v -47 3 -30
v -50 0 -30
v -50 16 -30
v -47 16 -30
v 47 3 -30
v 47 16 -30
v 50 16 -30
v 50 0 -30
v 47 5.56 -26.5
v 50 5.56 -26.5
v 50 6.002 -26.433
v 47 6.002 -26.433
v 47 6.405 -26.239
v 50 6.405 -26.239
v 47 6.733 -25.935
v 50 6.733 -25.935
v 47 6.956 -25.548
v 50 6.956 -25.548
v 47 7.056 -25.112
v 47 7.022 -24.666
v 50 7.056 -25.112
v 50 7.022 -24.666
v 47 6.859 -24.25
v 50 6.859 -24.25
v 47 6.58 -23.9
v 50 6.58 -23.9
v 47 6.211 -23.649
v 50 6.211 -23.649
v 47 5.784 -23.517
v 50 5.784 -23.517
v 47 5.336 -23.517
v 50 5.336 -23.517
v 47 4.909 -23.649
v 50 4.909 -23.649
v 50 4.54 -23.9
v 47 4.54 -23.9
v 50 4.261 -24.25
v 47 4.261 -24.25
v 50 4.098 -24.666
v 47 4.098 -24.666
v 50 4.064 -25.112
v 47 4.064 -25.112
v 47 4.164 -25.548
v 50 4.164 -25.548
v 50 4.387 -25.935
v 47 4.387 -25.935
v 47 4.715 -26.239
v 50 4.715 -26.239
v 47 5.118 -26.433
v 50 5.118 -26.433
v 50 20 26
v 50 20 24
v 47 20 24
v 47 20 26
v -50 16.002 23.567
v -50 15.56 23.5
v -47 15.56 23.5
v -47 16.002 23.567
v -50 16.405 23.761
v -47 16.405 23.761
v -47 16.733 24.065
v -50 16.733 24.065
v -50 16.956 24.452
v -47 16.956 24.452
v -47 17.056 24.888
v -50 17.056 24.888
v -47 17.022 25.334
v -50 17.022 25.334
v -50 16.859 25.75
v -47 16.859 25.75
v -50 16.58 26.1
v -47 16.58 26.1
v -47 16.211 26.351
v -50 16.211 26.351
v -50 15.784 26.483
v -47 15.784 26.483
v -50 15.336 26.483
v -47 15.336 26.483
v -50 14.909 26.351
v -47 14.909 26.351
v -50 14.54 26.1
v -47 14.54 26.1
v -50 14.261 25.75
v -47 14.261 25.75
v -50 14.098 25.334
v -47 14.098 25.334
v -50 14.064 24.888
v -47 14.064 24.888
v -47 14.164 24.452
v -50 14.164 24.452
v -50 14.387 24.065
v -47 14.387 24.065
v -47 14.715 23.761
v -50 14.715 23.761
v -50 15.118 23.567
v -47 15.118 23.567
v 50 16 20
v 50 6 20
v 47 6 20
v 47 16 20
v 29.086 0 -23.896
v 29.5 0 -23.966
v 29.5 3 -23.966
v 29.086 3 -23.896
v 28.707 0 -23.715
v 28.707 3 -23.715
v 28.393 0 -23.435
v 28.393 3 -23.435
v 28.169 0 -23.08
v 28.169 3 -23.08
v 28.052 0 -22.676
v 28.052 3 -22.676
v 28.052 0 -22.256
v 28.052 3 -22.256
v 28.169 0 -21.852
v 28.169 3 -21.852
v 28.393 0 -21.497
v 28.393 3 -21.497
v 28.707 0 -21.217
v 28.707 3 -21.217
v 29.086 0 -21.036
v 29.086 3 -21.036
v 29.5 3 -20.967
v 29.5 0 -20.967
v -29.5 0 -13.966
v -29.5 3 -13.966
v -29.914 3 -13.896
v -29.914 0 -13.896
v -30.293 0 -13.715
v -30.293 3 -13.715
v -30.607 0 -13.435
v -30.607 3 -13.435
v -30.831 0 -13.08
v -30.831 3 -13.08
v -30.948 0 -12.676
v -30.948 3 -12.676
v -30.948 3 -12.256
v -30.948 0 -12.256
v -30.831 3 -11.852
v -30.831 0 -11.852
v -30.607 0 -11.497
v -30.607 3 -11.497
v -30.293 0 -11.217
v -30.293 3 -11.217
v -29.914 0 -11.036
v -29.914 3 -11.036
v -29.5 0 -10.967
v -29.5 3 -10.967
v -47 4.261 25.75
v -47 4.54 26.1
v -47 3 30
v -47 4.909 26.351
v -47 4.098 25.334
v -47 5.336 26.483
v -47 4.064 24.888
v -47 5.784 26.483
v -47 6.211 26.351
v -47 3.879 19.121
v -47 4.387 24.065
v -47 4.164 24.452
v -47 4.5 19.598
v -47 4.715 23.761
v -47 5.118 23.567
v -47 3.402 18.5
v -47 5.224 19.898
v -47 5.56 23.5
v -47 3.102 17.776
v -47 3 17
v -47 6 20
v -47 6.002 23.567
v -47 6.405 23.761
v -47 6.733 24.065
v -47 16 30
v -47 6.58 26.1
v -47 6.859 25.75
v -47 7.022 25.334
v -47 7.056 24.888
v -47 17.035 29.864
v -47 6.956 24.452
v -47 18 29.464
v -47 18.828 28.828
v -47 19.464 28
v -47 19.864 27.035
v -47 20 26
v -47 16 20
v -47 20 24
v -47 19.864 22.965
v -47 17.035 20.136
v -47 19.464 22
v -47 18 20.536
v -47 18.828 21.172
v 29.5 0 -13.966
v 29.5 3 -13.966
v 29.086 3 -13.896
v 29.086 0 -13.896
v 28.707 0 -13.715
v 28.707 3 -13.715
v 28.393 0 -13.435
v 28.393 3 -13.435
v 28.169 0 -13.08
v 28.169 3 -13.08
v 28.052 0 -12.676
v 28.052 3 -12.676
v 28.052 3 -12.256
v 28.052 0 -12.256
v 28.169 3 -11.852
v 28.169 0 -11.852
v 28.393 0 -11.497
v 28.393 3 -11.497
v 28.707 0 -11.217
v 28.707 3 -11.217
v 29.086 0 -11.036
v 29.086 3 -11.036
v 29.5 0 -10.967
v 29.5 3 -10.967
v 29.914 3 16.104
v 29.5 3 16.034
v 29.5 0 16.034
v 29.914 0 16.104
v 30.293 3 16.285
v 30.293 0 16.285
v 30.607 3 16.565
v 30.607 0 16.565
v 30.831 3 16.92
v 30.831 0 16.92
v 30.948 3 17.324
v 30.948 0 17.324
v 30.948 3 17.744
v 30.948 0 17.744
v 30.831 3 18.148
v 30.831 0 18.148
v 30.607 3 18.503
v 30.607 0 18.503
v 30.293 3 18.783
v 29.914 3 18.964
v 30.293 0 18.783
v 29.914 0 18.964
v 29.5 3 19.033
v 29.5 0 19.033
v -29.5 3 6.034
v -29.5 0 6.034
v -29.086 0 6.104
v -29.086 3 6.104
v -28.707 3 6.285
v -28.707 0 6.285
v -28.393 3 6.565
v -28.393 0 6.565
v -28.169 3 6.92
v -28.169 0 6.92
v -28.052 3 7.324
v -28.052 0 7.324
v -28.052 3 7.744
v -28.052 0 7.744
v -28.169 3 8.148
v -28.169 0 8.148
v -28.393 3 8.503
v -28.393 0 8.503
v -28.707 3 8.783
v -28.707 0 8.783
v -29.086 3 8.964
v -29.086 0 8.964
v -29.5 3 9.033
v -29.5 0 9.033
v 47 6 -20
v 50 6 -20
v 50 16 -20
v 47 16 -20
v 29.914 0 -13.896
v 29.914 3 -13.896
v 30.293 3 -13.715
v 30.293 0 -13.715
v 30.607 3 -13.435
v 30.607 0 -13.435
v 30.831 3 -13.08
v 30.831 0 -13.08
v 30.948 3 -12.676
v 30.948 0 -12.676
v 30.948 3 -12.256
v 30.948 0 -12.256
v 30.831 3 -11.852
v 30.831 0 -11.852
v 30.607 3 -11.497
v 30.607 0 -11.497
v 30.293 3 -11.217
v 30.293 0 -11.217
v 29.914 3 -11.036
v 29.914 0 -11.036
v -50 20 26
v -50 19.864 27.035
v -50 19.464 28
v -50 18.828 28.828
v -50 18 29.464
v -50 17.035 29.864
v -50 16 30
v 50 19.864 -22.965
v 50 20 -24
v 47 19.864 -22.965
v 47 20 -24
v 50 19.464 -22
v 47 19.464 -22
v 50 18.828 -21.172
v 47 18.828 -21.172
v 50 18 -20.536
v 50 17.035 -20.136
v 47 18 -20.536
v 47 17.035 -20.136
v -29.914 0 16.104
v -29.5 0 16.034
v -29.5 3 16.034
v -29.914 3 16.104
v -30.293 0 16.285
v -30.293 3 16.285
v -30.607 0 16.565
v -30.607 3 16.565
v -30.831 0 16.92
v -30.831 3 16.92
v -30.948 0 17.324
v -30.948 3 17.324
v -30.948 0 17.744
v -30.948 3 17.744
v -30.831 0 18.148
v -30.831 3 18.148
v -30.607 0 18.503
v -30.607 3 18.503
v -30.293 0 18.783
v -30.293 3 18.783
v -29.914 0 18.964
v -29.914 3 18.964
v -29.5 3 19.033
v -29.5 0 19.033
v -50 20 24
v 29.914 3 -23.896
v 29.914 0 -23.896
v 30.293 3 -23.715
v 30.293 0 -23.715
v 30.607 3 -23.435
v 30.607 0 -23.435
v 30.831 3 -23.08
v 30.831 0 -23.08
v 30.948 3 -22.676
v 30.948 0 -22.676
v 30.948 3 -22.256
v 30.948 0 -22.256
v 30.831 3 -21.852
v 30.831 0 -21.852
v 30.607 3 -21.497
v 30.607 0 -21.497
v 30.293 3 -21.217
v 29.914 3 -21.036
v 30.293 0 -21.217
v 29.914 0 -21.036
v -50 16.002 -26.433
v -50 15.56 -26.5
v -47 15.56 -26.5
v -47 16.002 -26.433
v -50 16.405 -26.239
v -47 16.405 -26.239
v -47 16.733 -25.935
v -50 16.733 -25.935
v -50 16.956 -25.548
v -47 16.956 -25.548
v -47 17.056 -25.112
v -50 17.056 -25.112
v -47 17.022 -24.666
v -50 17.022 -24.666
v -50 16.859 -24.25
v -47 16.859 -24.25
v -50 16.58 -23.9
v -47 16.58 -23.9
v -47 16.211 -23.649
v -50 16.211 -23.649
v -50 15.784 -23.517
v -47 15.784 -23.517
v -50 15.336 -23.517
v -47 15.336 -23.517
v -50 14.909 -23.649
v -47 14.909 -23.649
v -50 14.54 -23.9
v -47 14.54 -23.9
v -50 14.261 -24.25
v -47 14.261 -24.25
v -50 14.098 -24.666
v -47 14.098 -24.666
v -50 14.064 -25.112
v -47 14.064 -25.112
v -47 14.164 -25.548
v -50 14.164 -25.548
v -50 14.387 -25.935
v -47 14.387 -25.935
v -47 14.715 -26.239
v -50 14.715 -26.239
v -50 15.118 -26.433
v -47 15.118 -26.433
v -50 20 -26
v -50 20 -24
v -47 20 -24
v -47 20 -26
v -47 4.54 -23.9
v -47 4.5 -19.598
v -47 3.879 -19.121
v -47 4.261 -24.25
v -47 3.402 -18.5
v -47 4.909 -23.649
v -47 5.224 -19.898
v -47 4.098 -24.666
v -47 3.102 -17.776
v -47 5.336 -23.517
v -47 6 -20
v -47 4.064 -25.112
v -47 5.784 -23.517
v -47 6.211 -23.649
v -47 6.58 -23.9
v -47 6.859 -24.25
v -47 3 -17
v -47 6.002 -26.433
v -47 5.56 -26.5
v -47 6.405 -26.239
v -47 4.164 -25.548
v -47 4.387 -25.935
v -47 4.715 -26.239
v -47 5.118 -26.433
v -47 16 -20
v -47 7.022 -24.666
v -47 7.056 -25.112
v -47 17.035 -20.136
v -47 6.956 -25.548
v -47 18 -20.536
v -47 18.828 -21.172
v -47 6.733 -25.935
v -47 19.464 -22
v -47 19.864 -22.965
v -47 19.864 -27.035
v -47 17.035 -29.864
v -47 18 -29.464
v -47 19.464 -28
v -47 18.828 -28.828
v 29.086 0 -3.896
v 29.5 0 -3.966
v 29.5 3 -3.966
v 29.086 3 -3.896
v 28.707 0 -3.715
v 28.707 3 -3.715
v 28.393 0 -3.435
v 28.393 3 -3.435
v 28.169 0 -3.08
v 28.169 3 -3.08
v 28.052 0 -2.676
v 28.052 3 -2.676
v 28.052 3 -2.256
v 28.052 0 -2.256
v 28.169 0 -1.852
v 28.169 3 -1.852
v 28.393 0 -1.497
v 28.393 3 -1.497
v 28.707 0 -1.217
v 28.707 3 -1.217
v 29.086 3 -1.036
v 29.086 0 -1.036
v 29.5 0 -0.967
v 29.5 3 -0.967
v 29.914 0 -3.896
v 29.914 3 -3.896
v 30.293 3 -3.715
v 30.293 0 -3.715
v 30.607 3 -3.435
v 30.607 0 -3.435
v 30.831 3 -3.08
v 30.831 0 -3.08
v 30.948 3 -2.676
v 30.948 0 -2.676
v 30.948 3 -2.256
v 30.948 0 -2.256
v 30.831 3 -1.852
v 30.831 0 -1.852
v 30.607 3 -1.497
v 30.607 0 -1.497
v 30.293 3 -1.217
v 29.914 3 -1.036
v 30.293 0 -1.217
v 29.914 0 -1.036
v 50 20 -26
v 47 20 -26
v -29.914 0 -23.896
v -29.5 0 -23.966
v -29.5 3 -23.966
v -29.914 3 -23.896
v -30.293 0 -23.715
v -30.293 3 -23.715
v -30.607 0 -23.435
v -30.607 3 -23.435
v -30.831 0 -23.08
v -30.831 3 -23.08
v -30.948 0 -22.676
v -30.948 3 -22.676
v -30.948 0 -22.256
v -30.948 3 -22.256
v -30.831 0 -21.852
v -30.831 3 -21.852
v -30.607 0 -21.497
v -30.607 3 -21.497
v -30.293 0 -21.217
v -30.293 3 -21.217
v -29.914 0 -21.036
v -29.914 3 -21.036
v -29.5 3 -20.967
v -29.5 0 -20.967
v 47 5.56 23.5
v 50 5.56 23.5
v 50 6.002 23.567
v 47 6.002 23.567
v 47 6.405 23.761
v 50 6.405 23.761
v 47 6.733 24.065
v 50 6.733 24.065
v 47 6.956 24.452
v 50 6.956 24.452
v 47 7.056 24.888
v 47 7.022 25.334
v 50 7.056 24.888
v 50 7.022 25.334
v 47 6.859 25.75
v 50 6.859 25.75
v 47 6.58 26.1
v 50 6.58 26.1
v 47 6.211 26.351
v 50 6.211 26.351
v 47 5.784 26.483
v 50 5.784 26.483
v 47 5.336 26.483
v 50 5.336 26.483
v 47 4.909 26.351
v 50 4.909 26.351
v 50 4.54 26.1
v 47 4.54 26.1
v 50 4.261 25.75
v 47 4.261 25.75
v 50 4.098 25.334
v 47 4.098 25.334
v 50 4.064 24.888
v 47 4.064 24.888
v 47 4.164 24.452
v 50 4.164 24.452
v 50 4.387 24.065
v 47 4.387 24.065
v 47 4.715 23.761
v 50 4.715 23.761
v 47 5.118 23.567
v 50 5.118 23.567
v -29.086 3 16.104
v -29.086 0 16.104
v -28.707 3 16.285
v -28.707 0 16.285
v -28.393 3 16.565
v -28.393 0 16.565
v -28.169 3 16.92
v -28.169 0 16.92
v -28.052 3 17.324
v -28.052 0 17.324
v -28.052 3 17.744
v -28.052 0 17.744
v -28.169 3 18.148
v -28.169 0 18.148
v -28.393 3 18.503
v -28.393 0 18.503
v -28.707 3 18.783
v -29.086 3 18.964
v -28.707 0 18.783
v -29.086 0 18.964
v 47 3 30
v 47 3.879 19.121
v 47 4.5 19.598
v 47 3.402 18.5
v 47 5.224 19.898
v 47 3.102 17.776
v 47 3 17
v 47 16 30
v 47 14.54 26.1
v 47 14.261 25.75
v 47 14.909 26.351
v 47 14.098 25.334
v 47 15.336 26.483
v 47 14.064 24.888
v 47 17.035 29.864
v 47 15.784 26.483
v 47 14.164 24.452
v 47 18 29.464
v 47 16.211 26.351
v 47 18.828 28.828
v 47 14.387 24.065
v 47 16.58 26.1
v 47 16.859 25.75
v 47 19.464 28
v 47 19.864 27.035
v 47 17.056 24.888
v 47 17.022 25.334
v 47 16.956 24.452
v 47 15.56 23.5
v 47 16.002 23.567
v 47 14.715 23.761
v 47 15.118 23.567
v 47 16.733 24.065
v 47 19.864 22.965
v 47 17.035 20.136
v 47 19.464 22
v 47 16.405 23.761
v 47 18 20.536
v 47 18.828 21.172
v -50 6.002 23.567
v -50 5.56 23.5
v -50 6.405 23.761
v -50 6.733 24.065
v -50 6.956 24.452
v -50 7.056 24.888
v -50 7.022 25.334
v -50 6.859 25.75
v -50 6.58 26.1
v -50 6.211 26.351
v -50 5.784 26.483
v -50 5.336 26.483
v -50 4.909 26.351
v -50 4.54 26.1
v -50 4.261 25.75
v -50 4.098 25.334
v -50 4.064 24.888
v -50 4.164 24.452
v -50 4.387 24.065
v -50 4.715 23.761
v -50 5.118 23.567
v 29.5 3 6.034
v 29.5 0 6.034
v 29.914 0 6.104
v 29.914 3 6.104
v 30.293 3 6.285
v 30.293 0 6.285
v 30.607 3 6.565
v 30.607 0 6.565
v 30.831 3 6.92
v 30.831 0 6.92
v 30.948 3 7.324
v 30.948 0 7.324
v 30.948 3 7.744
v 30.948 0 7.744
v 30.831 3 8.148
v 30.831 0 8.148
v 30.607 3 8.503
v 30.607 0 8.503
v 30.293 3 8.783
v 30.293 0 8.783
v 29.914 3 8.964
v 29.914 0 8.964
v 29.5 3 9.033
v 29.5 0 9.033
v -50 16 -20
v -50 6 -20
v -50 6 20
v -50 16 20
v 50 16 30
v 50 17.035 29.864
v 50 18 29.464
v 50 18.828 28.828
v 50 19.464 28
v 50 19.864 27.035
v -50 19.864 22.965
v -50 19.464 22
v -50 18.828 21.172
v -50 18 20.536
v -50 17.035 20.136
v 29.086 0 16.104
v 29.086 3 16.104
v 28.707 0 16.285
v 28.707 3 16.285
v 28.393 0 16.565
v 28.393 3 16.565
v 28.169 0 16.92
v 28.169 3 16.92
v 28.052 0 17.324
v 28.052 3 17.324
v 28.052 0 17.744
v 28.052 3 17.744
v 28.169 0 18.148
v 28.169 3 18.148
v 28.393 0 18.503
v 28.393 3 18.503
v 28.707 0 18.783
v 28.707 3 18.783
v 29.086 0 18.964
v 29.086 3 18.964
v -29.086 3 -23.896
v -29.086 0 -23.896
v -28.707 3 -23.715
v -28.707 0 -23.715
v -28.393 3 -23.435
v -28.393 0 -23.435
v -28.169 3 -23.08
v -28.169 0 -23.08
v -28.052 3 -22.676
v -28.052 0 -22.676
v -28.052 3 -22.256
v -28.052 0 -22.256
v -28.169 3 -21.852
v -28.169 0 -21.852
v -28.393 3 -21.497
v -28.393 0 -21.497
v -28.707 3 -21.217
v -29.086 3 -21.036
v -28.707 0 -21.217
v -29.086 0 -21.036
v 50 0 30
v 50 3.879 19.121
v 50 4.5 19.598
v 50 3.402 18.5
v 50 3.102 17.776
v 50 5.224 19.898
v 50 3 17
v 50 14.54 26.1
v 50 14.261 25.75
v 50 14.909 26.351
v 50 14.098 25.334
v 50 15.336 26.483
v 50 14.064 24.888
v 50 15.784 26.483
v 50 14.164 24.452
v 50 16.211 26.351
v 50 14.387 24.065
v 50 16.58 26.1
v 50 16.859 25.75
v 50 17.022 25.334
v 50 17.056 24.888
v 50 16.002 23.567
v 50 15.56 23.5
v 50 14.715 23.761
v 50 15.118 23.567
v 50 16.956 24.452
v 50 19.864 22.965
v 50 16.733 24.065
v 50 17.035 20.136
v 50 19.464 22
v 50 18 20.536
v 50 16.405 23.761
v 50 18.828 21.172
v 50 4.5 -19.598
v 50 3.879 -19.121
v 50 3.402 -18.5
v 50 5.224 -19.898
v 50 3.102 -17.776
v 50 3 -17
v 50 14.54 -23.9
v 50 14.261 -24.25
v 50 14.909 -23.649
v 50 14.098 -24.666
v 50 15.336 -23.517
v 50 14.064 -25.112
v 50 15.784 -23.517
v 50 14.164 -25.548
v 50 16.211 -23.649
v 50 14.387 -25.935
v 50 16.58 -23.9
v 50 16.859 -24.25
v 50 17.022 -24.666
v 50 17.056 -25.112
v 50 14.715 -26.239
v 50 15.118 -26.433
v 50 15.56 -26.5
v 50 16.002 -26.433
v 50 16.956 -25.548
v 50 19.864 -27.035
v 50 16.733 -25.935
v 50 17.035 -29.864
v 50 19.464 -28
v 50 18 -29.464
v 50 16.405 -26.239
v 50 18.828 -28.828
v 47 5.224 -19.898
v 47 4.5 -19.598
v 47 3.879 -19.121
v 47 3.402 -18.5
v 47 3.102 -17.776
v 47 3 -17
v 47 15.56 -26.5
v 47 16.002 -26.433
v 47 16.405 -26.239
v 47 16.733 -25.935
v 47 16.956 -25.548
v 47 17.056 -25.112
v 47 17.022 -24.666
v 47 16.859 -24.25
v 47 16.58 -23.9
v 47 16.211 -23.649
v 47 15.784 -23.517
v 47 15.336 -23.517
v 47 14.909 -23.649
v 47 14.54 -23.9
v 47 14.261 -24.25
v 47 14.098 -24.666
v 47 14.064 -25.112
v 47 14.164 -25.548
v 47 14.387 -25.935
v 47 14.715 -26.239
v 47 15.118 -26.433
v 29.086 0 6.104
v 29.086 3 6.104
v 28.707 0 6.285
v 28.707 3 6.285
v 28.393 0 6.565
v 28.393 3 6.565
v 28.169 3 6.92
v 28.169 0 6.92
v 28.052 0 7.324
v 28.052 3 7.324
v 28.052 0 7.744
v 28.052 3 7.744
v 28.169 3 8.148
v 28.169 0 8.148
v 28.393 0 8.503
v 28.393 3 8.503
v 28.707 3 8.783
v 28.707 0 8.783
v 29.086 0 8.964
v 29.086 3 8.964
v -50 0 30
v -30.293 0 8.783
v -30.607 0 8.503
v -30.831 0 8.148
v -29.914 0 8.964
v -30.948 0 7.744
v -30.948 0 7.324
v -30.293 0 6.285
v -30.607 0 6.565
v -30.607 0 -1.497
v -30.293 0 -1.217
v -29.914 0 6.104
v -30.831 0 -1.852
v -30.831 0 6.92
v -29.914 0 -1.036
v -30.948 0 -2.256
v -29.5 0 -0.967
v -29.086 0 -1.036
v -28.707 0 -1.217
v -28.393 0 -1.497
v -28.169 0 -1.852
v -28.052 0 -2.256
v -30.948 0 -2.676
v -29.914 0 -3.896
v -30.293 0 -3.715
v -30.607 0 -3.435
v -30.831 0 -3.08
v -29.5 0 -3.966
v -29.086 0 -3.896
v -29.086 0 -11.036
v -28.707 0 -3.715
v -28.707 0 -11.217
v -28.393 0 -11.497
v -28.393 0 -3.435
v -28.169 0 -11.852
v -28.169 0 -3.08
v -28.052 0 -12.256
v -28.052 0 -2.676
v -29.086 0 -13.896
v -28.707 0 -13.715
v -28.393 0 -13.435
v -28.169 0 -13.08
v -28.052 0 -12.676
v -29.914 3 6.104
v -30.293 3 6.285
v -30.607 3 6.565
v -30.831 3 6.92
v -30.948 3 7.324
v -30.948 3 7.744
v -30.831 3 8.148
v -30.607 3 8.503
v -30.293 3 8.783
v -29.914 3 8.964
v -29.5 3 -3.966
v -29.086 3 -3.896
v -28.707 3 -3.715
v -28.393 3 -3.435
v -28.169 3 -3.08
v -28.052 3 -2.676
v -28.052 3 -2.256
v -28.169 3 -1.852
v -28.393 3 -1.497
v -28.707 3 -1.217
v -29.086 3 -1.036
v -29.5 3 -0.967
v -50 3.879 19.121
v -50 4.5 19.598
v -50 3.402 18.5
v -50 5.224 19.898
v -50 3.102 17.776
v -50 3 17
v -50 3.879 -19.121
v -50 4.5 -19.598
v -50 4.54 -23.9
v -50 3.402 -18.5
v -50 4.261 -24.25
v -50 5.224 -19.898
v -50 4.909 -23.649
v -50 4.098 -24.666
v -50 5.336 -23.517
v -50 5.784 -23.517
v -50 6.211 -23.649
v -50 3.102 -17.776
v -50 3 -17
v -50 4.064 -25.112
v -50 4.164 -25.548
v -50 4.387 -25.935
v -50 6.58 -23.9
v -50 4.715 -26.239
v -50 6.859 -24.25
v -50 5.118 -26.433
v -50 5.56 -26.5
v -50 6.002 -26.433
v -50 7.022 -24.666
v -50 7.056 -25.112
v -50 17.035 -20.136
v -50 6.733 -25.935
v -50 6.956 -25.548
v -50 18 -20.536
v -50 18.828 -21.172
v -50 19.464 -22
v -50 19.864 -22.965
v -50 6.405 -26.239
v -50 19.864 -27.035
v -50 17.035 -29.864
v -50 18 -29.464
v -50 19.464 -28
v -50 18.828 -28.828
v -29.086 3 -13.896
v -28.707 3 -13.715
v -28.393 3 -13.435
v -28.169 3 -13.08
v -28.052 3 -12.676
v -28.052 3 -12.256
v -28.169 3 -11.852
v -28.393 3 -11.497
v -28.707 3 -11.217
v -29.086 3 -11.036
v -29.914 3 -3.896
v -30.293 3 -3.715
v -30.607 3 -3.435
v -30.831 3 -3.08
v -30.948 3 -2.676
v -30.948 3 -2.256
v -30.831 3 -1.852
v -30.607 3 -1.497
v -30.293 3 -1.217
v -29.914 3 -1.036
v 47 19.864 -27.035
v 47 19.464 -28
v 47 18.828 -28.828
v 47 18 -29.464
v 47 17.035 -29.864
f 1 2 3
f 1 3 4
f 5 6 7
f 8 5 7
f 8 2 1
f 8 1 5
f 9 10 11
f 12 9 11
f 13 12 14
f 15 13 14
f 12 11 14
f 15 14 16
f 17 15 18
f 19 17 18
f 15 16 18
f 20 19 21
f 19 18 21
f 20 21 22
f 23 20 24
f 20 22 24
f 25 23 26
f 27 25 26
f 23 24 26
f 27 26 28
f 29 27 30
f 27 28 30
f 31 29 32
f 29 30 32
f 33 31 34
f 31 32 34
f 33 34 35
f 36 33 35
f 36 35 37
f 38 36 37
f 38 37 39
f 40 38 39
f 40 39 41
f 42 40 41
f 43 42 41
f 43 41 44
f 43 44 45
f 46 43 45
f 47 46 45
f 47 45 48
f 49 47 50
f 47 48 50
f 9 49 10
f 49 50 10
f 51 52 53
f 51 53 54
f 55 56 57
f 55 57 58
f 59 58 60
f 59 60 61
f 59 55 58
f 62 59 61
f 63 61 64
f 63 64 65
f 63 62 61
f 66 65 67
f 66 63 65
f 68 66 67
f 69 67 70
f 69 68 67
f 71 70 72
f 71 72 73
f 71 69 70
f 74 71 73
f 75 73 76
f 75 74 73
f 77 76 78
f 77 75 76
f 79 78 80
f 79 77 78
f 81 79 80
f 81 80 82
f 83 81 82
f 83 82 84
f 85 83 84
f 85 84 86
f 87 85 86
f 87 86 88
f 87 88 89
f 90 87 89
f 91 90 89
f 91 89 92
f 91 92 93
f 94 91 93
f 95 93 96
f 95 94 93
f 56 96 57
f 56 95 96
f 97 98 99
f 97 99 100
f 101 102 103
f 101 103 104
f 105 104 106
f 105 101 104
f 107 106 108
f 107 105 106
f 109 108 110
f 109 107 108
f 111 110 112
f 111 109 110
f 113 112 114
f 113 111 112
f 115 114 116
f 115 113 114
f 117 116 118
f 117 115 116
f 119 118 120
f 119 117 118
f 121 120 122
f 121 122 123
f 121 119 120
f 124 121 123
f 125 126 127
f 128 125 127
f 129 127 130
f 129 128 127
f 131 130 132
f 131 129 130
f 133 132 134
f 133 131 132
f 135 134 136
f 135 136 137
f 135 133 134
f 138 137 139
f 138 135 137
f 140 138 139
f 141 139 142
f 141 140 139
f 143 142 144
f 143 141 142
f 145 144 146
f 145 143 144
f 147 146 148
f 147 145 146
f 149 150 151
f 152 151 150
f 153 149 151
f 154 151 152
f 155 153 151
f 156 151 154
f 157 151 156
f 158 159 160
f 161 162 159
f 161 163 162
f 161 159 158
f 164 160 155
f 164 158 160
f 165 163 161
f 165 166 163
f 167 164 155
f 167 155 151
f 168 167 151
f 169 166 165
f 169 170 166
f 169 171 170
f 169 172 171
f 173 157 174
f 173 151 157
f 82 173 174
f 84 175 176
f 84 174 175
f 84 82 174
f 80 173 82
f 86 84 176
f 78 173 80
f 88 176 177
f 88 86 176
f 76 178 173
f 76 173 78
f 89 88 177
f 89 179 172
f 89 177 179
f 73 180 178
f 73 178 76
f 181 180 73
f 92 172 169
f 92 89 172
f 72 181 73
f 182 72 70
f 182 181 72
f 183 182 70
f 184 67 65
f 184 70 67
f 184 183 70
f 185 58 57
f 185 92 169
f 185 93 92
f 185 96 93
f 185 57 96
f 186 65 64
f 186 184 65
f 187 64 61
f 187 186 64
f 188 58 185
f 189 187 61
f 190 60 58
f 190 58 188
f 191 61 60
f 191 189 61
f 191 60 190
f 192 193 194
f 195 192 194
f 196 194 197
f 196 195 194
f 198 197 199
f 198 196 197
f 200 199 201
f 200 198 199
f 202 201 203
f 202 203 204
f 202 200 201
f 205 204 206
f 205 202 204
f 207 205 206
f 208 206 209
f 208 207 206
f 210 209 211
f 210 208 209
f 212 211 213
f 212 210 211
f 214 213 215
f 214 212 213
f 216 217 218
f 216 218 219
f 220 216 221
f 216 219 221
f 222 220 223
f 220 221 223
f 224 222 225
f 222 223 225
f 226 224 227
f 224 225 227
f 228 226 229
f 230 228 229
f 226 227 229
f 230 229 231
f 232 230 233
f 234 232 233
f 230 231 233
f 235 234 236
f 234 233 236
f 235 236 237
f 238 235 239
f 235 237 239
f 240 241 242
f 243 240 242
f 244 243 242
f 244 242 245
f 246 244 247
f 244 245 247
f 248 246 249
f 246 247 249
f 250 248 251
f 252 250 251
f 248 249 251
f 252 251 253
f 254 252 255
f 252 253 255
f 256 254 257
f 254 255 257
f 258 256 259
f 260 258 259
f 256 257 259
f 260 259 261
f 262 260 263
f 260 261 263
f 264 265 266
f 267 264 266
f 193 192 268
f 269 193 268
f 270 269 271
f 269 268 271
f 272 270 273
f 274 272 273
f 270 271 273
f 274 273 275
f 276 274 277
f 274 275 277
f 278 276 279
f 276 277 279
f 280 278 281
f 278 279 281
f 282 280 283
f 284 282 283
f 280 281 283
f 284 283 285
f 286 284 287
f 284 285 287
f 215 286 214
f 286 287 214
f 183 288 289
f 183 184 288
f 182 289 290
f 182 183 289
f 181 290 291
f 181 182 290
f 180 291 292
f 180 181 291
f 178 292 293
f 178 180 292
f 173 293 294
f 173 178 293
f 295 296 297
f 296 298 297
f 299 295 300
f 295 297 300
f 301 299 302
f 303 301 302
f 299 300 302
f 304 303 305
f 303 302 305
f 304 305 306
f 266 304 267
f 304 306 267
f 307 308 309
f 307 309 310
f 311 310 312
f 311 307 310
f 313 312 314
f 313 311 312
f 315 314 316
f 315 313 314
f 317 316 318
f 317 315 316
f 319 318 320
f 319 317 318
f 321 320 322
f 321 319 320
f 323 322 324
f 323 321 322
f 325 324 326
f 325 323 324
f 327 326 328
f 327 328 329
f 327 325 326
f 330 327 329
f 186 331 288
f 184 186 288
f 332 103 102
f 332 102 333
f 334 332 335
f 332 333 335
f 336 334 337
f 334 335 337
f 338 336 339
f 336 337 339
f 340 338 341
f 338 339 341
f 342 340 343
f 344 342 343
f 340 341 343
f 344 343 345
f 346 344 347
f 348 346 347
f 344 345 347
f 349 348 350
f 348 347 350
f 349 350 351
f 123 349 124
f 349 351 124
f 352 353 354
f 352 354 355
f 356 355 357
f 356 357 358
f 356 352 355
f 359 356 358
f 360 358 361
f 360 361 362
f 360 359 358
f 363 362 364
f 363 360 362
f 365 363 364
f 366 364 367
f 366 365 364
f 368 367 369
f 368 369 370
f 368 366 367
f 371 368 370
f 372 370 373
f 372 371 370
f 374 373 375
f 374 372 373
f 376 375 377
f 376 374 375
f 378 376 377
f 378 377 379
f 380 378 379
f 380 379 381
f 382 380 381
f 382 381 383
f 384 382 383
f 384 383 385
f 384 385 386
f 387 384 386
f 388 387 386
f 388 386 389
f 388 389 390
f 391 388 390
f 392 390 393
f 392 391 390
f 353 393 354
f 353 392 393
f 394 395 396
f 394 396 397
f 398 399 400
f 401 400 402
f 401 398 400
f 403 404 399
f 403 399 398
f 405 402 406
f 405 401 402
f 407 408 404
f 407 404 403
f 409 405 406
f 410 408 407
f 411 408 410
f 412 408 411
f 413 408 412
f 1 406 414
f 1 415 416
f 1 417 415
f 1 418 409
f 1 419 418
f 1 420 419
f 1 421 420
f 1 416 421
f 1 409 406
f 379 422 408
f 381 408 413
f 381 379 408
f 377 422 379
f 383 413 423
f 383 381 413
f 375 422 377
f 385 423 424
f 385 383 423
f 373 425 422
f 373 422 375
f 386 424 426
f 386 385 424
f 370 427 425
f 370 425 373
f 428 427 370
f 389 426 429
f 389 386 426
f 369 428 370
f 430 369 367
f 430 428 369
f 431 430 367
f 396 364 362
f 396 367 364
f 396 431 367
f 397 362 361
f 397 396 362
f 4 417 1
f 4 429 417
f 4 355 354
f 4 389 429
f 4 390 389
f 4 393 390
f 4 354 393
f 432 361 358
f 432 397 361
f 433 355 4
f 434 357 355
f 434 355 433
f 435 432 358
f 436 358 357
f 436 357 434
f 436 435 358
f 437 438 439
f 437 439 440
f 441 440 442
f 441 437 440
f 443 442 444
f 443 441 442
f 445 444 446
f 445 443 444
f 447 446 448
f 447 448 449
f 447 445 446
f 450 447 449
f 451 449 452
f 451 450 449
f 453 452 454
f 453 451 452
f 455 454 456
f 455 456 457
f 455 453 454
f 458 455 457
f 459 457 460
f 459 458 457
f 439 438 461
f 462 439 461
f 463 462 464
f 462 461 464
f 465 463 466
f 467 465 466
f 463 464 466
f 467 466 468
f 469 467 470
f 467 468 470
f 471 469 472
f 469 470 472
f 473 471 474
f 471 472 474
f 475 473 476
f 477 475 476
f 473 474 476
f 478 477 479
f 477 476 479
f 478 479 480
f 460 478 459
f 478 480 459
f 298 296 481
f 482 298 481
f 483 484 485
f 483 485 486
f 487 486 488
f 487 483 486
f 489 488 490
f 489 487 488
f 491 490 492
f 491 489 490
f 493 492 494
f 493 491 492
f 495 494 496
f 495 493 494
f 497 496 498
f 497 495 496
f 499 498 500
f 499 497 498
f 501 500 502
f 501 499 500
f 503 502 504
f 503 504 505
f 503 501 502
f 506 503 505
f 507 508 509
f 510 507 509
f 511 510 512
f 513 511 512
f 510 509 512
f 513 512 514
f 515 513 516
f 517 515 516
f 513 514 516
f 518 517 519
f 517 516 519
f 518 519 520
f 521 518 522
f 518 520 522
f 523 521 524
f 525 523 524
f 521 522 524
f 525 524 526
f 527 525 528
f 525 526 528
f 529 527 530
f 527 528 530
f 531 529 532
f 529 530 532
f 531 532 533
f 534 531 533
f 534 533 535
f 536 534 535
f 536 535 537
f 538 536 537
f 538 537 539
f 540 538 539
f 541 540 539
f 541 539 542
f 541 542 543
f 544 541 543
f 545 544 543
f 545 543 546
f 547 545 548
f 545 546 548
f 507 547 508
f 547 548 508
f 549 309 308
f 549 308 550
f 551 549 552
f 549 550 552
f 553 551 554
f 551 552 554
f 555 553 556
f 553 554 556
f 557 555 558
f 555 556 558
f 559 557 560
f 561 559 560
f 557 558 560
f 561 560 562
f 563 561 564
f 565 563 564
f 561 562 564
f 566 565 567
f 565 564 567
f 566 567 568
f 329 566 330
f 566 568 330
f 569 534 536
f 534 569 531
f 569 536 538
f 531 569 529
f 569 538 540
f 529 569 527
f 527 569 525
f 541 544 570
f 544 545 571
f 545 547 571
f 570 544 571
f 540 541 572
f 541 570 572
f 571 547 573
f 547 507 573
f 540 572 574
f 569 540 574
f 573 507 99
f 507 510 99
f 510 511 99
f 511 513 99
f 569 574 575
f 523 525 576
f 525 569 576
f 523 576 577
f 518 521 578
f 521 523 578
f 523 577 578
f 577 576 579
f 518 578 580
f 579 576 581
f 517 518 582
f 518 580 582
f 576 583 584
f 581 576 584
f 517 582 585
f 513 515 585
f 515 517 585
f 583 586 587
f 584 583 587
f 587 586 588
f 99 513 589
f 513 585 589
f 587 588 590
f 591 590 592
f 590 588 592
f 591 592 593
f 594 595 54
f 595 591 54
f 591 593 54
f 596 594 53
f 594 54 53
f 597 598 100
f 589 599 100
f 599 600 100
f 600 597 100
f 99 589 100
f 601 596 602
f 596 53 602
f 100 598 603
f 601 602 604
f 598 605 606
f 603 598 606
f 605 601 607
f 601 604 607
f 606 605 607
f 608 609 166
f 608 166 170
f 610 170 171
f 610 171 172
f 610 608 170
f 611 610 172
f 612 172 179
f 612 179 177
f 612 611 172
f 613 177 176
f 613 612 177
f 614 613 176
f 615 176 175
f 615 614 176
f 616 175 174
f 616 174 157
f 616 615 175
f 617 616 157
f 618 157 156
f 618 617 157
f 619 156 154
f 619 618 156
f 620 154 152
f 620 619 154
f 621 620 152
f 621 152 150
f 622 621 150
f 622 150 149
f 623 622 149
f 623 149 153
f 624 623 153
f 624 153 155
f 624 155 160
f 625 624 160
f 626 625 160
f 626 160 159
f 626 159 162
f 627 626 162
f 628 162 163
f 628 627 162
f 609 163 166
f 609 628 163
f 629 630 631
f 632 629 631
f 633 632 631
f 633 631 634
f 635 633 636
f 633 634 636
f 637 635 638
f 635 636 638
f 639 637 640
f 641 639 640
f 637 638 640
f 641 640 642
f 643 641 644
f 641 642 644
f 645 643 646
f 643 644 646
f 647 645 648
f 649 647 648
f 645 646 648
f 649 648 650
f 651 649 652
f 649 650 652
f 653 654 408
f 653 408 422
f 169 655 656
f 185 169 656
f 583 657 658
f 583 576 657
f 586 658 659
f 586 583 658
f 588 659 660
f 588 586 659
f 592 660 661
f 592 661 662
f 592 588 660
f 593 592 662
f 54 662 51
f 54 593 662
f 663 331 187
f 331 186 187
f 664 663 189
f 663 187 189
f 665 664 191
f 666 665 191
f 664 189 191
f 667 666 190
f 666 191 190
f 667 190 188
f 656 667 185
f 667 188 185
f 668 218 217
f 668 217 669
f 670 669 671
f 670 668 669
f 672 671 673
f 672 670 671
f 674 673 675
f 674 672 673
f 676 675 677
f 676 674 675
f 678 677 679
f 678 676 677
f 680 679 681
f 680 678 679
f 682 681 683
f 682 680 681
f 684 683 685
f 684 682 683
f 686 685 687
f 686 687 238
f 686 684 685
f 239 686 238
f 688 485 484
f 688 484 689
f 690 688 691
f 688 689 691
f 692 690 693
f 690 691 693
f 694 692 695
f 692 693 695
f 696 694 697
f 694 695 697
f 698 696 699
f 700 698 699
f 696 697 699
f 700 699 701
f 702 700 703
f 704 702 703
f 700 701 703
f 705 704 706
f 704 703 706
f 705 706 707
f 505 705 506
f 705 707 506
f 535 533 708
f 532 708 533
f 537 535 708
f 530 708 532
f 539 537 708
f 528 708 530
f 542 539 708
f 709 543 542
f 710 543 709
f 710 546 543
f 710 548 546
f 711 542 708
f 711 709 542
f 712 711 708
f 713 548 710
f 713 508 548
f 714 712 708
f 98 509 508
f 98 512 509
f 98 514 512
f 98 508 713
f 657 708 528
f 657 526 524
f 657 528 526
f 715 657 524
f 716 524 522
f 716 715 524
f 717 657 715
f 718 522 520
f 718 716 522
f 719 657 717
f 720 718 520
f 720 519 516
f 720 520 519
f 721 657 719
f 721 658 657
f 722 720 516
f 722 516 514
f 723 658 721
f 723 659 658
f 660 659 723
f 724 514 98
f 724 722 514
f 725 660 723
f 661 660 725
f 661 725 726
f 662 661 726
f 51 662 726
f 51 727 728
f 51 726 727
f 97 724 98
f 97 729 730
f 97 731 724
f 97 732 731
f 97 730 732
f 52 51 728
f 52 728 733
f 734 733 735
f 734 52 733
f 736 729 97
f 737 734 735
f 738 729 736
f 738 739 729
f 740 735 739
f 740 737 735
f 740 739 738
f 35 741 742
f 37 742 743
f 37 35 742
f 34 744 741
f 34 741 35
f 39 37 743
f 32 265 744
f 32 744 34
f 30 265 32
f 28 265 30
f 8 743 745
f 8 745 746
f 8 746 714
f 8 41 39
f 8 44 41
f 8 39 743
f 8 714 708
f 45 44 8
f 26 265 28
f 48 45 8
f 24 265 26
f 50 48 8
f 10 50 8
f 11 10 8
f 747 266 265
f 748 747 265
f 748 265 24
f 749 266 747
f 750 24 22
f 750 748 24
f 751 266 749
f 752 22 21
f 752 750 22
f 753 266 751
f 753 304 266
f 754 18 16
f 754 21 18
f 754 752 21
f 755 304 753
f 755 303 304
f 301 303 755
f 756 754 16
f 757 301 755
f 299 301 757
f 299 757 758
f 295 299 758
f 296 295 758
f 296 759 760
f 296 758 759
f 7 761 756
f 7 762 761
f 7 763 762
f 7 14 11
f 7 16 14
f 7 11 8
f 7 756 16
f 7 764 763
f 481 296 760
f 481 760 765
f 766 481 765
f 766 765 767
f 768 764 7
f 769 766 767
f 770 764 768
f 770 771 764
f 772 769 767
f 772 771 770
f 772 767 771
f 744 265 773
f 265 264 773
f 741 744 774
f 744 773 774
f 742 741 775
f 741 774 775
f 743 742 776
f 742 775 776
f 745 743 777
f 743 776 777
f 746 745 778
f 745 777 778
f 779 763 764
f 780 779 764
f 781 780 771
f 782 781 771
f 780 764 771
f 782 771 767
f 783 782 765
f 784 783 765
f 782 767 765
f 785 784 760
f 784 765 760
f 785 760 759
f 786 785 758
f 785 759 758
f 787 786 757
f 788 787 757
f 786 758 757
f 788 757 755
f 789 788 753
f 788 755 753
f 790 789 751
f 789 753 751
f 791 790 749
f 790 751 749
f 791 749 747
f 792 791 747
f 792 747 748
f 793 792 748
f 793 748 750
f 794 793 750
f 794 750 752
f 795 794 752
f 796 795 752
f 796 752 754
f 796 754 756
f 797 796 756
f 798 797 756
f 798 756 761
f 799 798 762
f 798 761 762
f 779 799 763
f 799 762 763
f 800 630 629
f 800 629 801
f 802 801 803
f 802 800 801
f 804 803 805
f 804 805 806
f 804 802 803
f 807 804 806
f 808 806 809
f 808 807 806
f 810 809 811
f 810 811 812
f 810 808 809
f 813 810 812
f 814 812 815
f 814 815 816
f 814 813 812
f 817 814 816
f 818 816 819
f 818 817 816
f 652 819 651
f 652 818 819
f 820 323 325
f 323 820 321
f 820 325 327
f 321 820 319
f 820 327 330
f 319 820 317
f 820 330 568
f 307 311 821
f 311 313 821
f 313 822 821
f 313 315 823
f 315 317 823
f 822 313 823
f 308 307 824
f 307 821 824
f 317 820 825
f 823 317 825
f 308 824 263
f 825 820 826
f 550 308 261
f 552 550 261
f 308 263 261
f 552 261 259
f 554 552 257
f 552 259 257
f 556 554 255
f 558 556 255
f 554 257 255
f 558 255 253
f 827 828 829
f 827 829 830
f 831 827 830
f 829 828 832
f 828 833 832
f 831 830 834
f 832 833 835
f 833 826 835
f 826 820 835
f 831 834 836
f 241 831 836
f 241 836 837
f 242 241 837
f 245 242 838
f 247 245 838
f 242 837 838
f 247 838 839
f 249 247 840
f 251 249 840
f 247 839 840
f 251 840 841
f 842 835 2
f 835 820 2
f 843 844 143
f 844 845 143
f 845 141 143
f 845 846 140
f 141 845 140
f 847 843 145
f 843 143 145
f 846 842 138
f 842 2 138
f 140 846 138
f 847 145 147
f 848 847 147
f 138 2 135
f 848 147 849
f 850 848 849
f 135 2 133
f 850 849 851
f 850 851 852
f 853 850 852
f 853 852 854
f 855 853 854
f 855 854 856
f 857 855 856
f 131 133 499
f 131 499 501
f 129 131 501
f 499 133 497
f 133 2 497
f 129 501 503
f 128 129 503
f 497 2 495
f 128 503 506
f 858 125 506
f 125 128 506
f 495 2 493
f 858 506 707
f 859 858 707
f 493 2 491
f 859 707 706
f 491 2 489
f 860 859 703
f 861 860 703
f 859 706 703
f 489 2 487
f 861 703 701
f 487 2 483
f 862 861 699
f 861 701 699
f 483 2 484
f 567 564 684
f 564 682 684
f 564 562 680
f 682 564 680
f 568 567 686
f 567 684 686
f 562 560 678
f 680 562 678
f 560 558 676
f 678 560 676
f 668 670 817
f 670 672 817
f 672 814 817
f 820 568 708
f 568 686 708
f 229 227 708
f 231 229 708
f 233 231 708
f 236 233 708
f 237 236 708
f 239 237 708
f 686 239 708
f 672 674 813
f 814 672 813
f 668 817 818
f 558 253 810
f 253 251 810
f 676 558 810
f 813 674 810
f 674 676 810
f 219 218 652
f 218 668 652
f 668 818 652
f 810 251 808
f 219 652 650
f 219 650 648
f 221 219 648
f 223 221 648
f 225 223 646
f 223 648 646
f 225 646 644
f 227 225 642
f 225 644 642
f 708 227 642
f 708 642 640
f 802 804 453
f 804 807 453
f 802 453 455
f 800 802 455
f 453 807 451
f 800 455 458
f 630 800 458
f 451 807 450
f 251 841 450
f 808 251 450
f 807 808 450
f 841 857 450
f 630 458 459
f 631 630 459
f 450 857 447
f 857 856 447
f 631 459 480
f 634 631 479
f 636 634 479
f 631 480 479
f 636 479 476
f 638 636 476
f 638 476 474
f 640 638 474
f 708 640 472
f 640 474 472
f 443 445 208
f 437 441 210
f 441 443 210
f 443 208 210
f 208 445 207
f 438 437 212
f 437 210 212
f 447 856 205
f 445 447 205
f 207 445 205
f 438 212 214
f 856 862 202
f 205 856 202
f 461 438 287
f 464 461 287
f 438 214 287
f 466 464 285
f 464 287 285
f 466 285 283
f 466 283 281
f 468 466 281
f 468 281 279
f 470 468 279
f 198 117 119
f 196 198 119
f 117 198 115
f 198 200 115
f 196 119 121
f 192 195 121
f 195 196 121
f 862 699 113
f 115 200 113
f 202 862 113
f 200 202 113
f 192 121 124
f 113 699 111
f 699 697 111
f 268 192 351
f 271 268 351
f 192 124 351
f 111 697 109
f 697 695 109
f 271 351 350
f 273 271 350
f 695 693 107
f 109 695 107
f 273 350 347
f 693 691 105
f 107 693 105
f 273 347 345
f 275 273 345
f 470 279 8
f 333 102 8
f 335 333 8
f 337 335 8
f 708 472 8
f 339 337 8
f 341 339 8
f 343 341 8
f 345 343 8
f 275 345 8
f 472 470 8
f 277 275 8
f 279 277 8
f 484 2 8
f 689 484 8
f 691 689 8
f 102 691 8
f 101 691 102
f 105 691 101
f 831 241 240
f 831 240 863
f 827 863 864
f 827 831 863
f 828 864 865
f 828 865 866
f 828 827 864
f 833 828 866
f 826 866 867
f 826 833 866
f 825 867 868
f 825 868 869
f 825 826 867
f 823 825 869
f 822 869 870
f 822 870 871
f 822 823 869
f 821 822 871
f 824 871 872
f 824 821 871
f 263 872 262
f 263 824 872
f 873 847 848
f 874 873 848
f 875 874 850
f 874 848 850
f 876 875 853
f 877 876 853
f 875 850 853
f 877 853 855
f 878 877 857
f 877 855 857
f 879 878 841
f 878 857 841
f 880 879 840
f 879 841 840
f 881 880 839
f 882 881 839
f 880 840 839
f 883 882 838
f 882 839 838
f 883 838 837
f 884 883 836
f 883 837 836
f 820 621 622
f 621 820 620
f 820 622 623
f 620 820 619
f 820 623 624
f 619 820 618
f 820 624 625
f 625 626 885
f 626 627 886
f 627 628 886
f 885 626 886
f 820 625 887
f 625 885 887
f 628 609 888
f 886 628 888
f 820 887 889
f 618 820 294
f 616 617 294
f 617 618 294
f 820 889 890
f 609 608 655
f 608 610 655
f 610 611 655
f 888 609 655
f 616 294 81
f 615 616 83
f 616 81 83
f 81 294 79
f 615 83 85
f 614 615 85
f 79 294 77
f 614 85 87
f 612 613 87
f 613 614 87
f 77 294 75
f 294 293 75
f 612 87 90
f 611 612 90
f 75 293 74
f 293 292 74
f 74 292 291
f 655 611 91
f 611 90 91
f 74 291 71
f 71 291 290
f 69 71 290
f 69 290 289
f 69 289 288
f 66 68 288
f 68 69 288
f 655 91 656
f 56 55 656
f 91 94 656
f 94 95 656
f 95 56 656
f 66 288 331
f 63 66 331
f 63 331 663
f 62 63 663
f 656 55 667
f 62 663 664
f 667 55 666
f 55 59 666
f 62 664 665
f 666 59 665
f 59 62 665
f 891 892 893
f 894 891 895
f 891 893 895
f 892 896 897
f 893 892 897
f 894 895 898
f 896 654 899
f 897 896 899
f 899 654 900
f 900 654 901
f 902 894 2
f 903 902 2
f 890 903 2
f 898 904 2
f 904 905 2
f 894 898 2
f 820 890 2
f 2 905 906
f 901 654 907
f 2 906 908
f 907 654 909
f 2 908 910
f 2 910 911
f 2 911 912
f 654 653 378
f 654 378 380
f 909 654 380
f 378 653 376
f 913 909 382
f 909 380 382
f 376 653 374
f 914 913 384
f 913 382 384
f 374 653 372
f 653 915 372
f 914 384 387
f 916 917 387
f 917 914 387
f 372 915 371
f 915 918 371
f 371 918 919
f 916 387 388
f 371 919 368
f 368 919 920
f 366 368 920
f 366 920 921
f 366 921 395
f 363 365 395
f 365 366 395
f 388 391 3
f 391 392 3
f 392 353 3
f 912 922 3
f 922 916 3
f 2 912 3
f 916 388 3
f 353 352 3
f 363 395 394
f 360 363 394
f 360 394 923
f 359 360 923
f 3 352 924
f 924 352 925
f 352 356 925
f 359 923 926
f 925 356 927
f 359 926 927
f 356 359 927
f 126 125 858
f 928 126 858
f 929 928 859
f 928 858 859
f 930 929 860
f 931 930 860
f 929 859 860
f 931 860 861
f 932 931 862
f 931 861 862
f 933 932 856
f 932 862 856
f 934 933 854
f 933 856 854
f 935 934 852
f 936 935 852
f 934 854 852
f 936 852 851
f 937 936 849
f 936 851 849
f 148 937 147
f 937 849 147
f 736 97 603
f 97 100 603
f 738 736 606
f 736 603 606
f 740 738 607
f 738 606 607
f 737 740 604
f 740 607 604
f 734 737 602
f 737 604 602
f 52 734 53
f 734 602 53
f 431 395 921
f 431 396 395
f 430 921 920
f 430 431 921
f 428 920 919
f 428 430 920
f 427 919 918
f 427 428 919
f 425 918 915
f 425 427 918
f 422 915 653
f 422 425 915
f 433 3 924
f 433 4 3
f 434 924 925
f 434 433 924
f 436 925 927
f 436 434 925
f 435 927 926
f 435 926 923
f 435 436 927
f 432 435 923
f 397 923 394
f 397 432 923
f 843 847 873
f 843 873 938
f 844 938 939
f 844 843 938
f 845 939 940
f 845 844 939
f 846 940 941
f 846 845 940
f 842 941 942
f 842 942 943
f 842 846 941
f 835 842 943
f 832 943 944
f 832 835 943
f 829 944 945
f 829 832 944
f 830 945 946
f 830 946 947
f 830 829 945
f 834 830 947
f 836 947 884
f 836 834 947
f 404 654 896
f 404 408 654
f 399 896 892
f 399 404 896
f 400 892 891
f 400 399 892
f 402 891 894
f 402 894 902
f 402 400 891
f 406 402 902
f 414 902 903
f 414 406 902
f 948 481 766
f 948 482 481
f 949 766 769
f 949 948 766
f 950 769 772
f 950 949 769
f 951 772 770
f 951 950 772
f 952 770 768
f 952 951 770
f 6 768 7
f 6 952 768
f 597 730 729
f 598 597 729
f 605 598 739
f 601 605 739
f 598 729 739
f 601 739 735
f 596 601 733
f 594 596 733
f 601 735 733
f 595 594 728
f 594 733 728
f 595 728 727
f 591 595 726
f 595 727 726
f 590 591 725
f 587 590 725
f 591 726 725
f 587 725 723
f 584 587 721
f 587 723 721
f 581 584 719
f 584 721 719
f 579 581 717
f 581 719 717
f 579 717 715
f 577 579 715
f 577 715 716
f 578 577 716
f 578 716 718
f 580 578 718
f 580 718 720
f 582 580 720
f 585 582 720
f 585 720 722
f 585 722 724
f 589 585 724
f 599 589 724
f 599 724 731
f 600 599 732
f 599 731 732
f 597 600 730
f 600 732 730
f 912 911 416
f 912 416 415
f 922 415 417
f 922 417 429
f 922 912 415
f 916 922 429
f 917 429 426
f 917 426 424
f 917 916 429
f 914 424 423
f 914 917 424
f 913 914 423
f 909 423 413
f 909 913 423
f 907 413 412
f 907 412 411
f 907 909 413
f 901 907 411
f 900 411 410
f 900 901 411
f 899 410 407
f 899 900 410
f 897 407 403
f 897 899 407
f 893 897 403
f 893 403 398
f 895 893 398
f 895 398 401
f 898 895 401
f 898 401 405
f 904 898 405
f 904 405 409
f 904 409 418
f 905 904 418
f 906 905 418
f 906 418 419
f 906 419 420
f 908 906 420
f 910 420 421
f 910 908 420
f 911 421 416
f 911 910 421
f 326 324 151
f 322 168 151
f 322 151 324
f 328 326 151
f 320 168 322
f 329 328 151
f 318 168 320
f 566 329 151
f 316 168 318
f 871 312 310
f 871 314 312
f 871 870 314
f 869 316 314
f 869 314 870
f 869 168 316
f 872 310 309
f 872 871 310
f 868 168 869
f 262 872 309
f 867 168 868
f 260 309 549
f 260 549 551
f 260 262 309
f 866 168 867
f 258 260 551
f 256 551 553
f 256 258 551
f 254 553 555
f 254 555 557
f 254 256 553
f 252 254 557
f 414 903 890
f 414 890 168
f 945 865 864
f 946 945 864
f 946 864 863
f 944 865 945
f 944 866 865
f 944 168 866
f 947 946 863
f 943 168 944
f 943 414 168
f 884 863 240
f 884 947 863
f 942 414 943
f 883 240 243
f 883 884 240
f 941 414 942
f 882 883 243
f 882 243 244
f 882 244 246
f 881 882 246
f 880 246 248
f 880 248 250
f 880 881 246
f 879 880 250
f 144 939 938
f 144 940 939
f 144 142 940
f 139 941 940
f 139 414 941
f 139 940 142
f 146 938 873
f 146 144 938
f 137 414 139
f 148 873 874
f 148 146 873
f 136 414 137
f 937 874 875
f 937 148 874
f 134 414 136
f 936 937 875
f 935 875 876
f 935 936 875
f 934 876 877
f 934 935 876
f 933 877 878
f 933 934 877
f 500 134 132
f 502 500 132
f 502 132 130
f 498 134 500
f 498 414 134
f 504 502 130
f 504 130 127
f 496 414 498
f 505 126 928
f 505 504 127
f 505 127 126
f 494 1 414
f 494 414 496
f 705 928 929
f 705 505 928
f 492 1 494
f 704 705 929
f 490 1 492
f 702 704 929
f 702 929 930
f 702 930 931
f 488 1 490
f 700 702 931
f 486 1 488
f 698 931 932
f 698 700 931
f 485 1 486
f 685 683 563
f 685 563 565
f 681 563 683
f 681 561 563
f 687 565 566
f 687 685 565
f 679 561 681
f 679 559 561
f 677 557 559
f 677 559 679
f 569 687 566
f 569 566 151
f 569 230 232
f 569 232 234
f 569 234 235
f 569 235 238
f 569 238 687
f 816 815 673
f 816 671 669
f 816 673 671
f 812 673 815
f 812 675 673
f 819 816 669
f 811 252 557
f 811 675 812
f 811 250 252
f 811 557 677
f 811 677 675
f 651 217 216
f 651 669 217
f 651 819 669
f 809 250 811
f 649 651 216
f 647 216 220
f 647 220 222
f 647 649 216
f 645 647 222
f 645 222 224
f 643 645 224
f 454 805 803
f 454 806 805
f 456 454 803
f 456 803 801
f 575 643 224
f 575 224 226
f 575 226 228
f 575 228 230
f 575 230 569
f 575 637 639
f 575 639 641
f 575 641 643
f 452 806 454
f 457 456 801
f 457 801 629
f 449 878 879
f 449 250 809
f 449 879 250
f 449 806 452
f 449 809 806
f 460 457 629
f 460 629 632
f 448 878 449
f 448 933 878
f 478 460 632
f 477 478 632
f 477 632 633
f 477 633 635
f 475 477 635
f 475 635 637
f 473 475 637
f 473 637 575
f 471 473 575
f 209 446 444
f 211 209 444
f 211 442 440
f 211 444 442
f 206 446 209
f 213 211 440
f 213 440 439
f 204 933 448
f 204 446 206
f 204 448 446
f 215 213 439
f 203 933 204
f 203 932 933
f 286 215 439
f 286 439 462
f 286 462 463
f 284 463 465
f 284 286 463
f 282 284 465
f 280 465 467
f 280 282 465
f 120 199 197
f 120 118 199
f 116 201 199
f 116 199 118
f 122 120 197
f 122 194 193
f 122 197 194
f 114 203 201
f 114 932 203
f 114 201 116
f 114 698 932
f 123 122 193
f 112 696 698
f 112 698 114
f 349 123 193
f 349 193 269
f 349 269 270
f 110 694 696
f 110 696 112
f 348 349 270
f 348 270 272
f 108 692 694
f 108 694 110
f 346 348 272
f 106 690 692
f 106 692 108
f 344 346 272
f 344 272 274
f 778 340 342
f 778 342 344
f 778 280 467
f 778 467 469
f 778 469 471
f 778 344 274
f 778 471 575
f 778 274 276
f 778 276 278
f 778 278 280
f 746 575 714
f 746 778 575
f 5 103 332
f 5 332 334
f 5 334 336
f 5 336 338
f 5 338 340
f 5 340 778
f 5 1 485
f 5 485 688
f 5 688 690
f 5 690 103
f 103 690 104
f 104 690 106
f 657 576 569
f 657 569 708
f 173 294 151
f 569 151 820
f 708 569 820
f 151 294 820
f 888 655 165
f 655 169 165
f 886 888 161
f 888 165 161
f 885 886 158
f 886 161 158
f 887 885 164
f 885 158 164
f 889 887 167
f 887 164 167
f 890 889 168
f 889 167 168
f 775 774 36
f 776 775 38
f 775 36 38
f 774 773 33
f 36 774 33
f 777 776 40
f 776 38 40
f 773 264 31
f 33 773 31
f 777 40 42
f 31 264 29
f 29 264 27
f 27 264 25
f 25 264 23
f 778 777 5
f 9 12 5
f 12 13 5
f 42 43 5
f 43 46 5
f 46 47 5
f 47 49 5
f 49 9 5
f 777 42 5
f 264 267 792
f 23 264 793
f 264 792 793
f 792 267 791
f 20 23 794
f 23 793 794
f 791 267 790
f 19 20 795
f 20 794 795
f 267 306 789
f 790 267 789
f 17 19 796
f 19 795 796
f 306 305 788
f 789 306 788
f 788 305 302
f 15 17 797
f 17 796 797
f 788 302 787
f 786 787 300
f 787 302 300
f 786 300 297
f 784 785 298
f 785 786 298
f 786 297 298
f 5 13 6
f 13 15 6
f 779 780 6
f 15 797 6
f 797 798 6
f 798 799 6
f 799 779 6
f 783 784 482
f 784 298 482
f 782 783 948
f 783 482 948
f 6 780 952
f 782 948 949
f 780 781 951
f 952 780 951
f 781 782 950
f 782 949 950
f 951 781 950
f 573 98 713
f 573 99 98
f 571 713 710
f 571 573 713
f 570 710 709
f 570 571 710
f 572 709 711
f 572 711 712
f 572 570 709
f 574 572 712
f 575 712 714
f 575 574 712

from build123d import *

# Parameters (mm, degrees)
SKETCH1_W           = 100
SKETCH1_H           = 60
SKETCH1_R           = 1.5
BOSS_EXTRUDE1_DEPTH = 3
SKETCH3_R           = 1.5
SKETCH3_W           = 10
SKETCH3_H           = 17
BOSS_EXTRUDE2_DEPTH = 3
FILLET1_R           = 3
FILLET2_R           = 4


with BuildPart() as part:
    # Sketch1 → Boss-Extrude1 (new body)
    with BuildSketch(Plane(origin=(0, 0, 0), x_dir=(1, 0, 0), z_dir=(0, 1, 0))):
        Rectangle(SKETCH1_W, SKETCH1_H)
        with Locations((-29.462365137, -17.533964752)):
            Circle(SKETCH1_R, mode=Mode.SUBTRACT)
        with Locations((-29.462365137, -7.533964752)):
            Circle(SKETCH1_R, mode=Mode.SUBTRACT)
        with Locations((-29.462365137, 2.466035248)):
            Circle(SKETCH1_R, mode=Mode.SUBTRACT)
        with Locations((-29.462365137, 12.466035248)):
            Circle(SKETCH1_R, mode=Mode.SUBTRACT)
        with Locations((-29.462365137, 22.466035248)):
            Circle(SKETCH1_R, mode=Mode.SUBTRACT)
        with Locations((29.537634863, 22.466035248)):
            Circle(SKETCH1_R, mode=Mode.SUBTRACT)
        with Locations((29.537634863, 12.466035248)):
            Circle(SKETCH1_R, mode=Mode.SUBTRACT)
        with Locations((29.537634863, 2.466035248)):
            Circle(SKETCH1_R, mode=Mode.SUBTRACT)
        with Locations((29.537634863, -7.533964752)):
            Circle(SKETCH1_R, mode=Mode.SUBTRACT)
        with Locations((29.537634863, -17.533964752)):
            Circle(SKETCH1_R, mode=Mode.SUBTRACT)
    boss_extrude1 = extrude(amount=BOSS_EXTRUDE1_DEPTH)

    # Sketch3 → Boss-Extrude2 (add)
    with BuildSketch(Plane(origin=(50, 0, 0), x_dir=(0, 0, -1), z_dir=(1, 0, 0))):
        Polygon((-30, 3), (-25, 3), (-20, 3), (-20, 20), (-30, 20), align=None)
        with Locations((-25, 5.56)):
            Circle(SKETCH3_R, mode=Mode.SUBTRACT)
        with Locations((-25, 15.56)):
            Circle(SKETCH3_R, mode=Mode.SUBTRACT)
        with Locations((25, 11.5)):
            Rectangle(SKETCH3_W, SKETCH3_H)
        with Locations((25, 5.56)):
            Circle(SKETCH3_R, mode=Mode.SUBTRACT)
        with Locations((25, 15.56)):
            Circle(SKETCH3_R, mode=Mode.SUBTRACT)
    boss_extrude2 = extrude(amount=-BOSS_EXTRUDE2_DEPTH)

    # Mirror1: Boss-Extrude1, Boss-Extrude2 across plane
    add(boss_extrude1.mirror(Plane(origin=(0, 0, 0), x_dir=(0, 0, 1), z_dir=(1, 0, 0))))
    add(boss_extrude2.mirror(Plane(origin=(0, 0, 0), x_dir=(0, 0, 1), z_dir=(1, 0, 0))))

    # Fillet1
    fillet1_edges = [part.edges().sort_by_distance(p)[0] for p in [
        (48.5, 3, 20),
        (48.5, 3, -20),
        (-48.5, 3, 20),
        (-48.5, 3, -20),
    ]]
    fillet(fillet1_edges, radius=FILLET1_R)

    # Fillet2
    fillet2_edges = [part.edges().sort_by_distance(p)[0] for p in [
        (-48.5, 20, 30),
        (-48.5, 20, 20),
        (-48.5, 20, -20),
        (-48.5, 20, -30),
        (48.5, 20, -20),
        (48.5, 20, -30),
        (48.5, 20, 30),
        (48.5, 20, 20),
    ]]
    fillet(fillet2_edges, radius=FILLET2_R)


solid = part.part
